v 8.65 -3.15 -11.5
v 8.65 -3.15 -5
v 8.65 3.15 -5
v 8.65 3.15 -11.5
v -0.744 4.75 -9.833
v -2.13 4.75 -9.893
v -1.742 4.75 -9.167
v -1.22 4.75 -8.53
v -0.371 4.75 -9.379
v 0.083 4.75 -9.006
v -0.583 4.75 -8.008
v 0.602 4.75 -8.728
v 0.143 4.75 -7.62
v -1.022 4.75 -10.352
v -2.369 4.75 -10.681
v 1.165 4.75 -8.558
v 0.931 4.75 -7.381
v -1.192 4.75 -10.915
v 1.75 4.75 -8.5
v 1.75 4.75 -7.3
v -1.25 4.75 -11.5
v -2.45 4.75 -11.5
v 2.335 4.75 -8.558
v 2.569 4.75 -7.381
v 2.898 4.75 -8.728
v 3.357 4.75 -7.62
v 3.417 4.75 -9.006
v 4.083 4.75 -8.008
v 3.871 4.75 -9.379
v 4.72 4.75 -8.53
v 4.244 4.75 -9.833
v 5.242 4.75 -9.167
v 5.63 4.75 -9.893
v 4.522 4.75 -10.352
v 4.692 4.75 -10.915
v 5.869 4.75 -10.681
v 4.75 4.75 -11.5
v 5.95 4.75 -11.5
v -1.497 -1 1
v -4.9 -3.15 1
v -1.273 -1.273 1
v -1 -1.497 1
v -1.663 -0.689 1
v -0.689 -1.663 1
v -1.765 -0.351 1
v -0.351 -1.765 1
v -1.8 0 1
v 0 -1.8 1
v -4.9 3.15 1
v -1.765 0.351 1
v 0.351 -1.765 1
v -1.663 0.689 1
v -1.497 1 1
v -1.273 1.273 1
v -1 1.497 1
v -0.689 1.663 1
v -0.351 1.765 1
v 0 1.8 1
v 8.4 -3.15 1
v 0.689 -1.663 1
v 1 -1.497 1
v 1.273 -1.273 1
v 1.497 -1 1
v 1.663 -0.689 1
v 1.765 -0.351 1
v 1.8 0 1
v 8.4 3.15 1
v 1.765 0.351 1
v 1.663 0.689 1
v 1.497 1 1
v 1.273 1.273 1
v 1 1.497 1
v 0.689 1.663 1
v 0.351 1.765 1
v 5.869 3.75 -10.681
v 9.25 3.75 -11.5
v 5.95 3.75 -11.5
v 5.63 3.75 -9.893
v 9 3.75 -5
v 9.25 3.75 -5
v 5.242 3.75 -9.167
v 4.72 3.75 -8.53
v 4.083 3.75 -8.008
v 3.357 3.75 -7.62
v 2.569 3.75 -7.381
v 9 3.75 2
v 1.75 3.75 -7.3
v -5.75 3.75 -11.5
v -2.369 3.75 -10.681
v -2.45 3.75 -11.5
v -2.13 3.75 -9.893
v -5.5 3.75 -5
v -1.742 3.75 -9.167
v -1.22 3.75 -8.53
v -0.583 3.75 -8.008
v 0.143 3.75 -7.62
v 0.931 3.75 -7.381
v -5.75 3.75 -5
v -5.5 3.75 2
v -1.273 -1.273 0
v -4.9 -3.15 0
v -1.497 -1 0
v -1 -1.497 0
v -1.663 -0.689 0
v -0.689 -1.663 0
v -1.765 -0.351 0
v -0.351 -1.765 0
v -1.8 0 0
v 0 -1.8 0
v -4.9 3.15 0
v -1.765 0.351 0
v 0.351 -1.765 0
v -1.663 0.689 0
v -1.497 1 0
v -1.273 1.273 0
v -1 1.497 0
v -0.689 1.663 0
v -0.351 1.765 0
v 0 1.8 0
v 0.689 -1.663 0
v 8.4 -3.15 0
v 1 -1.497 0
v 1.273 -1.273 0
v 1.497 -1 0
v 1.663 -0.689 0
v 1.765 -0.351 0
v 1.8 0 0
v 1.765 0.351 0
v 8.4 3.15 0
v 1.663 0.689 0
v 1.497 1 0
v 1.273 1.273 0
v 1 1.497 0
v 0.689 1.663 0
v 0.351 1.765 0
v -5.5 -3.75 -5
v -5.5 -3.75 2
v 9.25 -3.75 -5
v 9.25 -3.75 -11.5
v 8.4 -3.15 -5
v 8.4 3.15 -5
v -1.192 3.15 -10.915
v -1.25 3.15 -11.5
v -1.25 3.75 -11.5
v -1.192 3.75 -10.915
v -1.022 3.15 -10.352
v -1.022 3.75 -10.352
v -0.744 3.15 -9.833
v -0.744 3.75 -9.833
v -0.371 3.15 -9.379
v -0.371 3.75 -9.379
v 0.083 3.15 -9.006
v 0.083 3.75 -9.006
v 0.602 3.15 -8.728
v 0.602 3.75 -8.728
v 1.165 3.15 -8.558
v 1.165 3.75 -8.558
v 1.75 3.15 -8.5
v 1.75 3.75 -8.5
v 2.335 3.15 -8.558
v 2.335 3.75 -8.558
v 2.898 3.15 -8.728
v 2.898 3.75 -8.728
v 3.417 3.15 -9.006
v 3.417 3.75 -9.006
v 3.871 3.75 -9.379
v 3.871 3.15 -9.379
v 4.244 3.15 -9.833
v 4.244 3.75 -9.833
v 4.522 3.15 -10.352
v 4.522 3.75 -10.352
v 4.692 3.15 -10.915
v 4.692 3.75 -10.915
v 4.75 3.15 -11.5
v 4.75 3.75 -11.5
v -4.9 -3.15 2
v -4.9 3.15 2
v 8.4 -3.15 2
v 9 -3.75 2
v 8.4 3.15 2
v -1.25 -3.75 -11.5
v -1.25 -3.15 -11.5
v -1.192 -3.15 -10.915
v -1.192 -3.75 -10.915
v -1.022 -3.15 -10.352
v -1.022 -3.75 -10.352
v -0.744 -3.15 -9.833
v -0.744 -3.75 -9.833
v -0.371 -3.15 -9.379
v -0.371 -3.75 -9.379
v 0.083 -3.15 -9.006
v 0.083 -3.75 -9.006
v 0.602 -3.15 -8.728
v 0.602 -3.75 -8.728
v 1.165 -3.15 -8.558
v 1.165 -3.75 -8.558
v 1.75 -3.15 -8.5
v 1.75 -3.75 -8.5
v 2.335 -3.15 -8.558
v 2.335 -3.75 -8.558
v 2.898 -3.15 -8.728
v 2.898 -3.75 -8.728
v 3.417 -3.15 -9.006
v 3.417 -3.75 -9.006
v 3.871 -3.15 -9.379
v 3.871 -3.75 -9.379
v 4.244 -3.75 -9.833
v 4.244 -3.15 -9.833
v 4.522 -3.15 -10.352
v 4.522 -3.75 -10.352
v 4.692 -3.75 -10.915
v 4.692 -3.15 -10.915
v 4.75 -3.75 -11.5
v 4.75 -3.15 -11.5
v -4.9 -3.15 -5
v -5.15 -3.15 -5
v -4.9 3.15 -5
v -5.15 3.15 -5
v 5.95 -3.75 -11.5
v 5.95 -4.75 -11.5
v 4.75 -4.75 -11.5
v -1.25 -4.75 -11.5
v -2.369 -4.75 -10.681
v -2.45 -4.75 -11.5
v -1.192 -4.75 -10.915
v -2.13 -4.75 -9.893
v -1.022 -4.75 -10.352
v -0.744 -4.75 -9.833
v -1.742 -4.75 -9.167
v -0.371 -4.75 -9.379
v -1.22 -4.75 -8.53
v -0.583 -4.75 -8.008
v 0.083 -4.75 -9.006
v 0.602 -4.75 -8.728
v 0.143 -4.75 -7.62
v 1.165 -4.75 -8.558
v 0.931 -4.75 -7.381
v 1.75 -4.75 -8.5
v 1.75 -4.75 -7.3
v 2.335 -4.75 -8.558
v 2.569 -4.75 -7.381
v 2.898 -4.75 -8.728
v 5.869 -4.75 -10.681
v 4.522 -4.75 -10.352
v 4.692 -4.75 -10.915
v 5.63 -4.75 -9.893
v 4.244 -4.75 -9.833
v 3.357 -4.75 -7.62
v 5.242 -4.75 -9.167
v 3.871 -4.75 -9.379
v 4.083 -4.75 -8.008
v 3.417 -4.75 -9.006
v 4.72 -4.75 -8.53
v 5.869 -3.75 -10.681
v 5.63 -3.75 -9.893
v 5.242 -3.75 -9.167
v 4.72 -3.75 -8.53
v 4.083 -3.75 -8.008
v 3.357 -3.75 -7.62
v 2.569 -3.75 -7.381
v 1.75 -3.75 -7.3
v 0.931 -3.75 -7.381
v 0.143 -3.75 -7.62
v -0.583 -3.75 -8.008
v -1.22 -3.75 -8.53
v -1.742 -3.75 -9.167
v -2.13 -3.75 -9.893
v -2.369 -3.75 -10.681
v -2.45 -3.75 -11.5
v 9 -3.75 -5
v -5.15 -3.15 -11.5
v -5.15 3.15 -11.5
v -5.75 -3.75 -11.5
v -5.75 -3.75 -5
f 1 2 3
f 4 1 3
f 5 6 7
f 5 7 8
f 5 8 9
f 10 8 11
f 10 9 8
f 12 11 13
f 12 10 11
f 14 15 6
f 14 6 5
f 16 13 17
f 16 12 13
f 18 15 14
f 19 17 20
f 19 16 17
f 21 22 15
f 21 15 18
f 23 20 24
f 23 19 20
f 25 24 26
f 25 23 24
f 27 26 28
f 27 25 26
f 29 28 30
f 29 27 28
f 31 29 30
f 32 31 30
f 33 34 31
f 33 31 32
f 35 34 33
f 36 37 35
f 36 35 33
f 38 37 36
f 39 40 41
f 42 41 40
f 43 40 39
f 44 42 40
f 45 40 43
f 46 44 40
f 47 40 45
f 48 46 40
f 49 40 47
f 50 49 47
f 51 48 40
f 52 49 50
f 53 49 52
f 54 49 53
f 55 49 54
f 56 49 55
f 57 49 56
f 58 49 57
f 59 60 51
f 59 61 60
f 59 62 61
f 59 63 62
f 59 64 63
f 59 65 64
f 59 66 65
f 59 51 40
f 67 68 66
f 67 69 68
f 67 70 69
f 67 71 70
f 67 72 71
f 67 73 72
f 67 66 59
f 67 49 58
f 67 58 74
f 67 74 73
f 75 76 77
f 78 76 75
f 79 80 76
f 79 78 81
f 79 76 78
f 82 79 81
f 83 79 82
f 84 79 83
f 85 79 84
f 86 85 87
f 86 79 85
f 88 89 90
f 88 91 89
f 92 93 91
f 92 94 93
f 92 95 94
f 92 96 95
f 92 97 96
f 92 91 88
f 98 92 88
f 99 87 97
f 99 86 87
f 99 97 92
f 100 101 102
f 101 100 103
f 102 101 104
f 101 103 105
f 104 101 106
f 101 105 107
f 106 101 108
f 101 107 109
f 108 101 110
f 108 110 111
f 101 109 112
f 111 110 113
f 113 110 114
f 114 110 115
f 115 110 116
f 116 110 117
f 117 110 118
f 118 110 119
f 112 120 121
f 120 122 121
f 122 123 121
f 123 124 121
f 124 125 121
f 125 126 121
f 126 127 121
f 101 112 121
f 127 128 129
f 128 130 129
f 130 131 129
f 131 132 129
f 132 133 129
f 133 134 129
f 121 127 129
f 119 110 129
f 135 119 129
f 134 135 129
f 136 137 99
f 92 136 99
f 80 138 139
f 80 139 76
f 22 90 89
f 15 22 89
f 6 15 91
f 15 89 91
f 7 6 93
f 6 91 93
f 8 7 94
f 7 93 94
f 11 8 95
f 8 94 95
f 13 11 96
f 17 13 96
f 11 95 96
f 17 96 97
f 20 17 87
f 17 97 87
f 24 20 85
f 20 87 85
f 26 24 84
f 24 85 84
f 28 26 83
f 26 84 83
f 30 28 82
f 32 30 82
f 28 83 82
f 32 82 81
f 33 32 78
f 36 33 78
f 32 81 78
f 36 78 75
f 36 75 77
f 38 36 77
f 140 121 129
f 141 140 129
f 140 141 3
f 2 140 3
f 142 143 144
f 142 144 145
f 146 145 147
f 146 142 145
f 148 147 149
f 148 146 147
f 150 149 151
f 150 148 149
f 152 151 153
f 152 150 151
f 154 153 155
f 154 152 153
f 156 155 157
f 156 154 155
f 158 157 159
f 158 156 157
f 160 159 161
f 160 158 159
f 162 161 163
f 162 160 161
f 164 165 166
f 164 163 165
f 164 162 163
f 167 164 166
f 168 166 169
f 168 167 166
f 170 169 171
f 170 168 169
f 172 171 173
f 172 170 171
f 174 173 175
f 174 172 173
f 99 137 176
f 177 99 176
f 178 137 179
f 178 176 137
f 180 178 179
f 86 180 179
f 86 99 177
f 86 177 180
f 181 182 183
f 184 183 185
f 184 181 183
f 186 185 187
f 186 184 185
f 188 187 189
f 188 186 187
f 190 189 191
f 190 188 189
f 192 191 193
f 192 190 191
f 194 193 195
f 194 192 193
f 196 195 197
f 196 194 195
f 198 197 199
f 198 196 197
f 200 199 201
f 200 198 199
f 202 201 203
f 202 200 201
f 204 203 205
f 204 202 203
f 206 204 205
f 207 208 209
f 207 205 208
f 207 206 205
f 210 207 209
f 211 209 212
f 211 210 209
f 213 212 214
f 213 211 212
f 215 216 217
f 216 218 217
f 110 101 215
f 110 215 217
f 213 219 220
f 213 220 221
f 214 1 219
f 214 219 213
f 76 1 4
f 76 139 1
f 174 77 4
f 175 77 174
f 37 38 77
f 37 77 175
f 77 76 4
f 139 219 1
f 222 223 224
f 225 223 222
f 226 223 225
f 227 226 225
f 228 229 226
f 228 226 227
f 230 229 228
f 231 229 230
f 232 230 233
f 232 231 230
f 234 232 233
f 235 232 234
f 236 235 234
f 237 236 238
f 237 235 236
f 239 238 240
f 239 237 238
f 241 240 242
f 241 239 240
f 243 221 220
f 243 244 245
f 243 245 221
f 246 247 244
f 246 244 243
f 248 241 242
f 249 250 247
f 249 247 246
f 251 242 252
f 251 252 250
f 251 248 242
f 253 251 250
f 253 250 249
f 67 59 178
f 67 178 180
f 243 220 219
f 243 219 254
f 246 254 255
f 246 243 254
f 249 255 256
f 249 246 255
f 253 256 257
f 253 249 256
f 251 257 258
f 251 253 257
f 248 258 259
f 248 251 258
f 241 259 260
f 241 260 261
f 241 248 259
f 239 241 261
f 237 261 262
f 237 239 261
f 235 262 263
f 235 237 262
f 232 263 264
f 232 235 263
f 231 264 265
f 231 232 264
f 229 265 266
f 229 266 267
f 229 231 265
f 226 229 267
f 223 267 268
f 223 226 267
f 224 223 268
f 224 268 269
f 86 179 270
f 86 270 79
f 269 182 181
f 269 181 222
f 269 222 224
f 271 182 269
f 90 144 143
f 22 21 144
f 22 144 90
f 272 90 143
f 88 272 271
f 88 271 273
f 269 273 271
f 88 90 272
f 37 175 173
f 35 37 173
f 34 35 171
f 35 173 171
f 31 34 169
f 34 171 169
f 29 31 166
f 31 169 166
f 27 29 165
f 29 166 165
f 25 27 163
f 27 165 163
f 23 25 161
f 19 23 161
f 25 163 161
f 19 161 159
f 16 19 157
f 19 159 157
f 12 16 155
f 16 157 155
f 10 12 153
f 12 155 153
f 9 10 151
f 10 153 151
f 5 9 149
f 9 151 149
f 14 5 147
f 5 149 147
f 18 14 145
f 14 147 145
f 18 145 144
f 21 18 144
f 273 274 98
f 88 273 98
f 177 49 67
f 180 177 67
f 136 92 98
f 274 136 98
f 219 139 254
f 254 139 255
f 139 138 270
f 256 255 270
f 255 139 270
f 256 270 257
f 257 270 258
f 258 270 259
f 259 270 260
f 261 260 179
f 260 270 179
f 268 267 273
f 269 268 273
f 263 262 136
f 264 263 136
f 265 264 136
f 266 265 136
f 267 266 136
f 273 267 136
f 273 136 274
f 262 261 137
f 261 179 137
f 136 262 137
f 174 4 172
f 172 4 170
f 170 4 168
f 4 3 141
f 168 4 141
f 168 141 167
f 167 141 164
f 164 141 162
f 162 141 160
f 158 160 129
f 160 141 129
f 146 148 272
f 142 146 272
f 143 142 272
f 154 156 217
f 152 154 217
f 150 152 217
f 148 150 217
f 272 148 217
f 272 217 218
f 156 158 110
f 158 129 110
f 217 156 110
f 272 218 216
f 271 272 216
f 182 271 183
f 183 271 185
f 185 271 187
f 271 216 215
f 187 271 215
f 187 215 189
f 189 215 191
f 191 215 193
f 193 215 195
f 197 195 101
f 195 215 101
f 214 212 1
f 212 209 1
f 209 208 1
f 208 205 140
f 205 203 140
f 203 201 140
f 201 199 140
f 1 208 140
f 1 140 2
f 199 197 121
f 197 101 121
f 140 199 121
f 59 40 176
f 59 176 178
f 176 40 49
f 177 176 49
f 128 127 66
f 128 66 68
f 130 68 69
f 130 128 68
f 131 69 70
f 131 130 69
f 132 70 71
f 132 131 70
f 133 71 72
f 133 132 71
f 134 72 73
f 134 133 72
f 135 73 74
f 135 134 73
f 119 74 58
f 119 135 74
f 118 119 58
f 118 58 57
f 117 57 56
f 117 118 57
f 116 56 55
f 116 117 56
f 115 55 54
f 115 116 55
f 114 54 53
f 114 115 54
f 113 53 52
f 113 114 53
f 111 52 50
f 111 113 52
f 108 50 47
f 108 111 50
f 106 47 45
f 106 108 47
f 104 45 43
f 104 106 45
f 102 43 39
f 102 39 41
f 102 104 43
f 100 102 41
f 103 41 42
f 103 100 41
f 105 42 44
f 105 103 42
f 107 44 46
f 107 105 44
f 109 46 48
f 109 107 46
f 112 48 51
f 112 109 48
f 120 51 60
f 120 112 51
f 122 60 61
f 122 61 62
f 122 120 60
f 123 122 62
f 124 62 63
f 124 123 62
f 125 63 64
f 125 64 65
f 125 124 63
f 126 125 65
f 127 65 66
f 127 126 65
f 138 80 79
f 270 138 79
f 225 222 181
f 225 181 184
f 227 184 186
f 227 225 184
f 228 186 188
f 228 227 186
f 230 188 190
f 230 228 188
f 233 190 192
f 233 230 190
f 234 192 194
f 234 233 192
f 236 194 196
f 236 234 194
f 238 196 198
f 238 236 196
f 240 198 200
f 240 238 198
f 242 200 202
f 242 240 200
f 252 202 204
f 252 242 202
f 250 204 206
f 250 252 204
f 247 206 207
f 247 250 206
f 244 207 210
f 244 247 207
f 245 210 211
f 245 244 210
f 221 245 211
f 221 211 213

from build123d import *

# Parameters (mm, degrees)
SKETCH_5_W          = 13.3
SKETCH_5_H          = 6.3
SKETCH_5_R          = 1.8
EXTRUDE_2_DEPTH     = 1
SKETCH_5_3_W        = 14.5
SKETCH_5_3_H        = 7.5
SKETCH_5_3_W_2      = 13.3
SKETCH_5_3_H_2      = 6.3
EXTRUDE_3_DEPTH     = 2
SKETCH_5_4_W        = 14.5
SKETCH_5_4_H        = 7.5
SKETCH_5_4_W_2      = 13.3
SKETCH_5_4_H_2      = 6.3
EXTRUDE_4_DEPTH     = 5
SKETCH_8_W          = 15
SKETCH_8_H          = 7.5
SKETCH_8_W_2        = 13.8
SKETCH_8_H_2        = 6.3
EXTRUDE_5_DEPTH     = 6.5
EXTRUDE_6_DEPTH     = 1
EXTRUDE_START       = 1
EXTRUDE_7_DEPTH     = 1
CUT_EXTRUDE_1_DEPTH = 18.03122133


with BuildPart() as part:
    # 草图5 → 凸台-拉伸2 (new body)
    with BuildSketch(Plane.XY):
        with Locations((1.75, 0)):
            Rectangle(SKETCH_5_W, SKETCH_5_H)
        Circle(SKETCH_5_R, mode=Mode.SUBTRACT)
    extrude(amount=EXTRUDE_2_DEPTH)

    # 草图5<3> → 凸台-拉伸3 (add)
    with BuildSketch(Plane.XY):
        with Locations((1.75, 0)):
            Rectangle(SKETCH_5_3_W, SKETCH_5_3_H)
        with Locations((1.75, 0)):
            Rectangle(SKETCH_5_3_W_2, SKETCH_5_3_H_2, mode=Mode.SUBTRACT)
    extrude(amount=EXTRUDE_3_DEPTH)

    # 草图5<4> → 凸台-拉伸4 (add)
    with BuildSketch(Plane.XY):
        with Locations((1.75, 0)):
            Rectangle(SKETCH_5_4_W, SKETCH_5_4_H)
        with Locations((1.75, 0)):
            Rectangle(SKETCH_5_4_W_2, SKETCH_5_4_H_2, mode=Mode.SUBTRACT)
    extrude(amount=-EXTRUDE_4_DEPTH)

    # 草图8 → 凸台-拉伸5 (add)
    with BuildSketch(Plane(origin=(0, 0, -5), x_dir=(-1, 0, 0), z_dir=(0, 0, -1))):
        with Locations((-1.75, 0)):
            Rectangle(SKETCH_8_W, SKETCH_8_H)
        with Locations((-1.75, 0)):
            Rectangle(SKETCH_8_W_2, SKETCH_8_H_2, mode=Mode.SUBTRACT)
    extrude(amount=EXTRUDE_5_DEPTH)

    # 草图9 → 凸台-拉伸6 (add)
    with BuildSketch(Plane(origin=(0, 3.75, 0), x_dir=(1, 0, 0), z_dir=(0, 1, 0))):
        with BuildLine():
            Line((5.95, 11.5), (4.75, 11.5))
            ThreePointArc((4.75, 11.5), (1.75, 8.5), (-1.25, 11.5))
            Line((-1.25, 11.5), (-2.45, 11.5))
            ThreePointArc((-2.45, 11.5), (1.75, 7.3), (5.95, 11.5))
        make_face()
    extrude(amount=EXTRUDE_6_DEPTH)

    # 草图11 → 凸台-拉伸7 (add)
    with BuildSketch(Plane.XZ.offset(3.75).offset(EXTRUDE_START)):
        with BuildLine():
            Line((4.75, -11.5), (5.95, -11.5))
            ThreePointArc((5.95, -11.5), (1.75, -7.3), (-2.45, -11.5))
            Line((-2.45, -11.5), (-1.25, -11.5))
            ThreePointArc((-1.25, -11.5), (1.75, -8.5), (4.75, -11.5))
        make_face()
    extrude(amount=-EXTRUDE_7_DEPTH)

    # 草图12 → 切除-拉伸1 (cut, through all)
    with BuildSketch(Plane.XZ.offset(3.75)):
        with BuildLine():
            Line((4.75, -11.5), (-1.25, -11.5))
            ThreePointArc((-1.25, -11.5), (1.75, -8.5), (4.75, -11.5))
        make_face()
    extrude(amount=-CUT_EXTRUDE_1_DEPTH, mode=Mode.SUBTRACT)


solid = part.part
